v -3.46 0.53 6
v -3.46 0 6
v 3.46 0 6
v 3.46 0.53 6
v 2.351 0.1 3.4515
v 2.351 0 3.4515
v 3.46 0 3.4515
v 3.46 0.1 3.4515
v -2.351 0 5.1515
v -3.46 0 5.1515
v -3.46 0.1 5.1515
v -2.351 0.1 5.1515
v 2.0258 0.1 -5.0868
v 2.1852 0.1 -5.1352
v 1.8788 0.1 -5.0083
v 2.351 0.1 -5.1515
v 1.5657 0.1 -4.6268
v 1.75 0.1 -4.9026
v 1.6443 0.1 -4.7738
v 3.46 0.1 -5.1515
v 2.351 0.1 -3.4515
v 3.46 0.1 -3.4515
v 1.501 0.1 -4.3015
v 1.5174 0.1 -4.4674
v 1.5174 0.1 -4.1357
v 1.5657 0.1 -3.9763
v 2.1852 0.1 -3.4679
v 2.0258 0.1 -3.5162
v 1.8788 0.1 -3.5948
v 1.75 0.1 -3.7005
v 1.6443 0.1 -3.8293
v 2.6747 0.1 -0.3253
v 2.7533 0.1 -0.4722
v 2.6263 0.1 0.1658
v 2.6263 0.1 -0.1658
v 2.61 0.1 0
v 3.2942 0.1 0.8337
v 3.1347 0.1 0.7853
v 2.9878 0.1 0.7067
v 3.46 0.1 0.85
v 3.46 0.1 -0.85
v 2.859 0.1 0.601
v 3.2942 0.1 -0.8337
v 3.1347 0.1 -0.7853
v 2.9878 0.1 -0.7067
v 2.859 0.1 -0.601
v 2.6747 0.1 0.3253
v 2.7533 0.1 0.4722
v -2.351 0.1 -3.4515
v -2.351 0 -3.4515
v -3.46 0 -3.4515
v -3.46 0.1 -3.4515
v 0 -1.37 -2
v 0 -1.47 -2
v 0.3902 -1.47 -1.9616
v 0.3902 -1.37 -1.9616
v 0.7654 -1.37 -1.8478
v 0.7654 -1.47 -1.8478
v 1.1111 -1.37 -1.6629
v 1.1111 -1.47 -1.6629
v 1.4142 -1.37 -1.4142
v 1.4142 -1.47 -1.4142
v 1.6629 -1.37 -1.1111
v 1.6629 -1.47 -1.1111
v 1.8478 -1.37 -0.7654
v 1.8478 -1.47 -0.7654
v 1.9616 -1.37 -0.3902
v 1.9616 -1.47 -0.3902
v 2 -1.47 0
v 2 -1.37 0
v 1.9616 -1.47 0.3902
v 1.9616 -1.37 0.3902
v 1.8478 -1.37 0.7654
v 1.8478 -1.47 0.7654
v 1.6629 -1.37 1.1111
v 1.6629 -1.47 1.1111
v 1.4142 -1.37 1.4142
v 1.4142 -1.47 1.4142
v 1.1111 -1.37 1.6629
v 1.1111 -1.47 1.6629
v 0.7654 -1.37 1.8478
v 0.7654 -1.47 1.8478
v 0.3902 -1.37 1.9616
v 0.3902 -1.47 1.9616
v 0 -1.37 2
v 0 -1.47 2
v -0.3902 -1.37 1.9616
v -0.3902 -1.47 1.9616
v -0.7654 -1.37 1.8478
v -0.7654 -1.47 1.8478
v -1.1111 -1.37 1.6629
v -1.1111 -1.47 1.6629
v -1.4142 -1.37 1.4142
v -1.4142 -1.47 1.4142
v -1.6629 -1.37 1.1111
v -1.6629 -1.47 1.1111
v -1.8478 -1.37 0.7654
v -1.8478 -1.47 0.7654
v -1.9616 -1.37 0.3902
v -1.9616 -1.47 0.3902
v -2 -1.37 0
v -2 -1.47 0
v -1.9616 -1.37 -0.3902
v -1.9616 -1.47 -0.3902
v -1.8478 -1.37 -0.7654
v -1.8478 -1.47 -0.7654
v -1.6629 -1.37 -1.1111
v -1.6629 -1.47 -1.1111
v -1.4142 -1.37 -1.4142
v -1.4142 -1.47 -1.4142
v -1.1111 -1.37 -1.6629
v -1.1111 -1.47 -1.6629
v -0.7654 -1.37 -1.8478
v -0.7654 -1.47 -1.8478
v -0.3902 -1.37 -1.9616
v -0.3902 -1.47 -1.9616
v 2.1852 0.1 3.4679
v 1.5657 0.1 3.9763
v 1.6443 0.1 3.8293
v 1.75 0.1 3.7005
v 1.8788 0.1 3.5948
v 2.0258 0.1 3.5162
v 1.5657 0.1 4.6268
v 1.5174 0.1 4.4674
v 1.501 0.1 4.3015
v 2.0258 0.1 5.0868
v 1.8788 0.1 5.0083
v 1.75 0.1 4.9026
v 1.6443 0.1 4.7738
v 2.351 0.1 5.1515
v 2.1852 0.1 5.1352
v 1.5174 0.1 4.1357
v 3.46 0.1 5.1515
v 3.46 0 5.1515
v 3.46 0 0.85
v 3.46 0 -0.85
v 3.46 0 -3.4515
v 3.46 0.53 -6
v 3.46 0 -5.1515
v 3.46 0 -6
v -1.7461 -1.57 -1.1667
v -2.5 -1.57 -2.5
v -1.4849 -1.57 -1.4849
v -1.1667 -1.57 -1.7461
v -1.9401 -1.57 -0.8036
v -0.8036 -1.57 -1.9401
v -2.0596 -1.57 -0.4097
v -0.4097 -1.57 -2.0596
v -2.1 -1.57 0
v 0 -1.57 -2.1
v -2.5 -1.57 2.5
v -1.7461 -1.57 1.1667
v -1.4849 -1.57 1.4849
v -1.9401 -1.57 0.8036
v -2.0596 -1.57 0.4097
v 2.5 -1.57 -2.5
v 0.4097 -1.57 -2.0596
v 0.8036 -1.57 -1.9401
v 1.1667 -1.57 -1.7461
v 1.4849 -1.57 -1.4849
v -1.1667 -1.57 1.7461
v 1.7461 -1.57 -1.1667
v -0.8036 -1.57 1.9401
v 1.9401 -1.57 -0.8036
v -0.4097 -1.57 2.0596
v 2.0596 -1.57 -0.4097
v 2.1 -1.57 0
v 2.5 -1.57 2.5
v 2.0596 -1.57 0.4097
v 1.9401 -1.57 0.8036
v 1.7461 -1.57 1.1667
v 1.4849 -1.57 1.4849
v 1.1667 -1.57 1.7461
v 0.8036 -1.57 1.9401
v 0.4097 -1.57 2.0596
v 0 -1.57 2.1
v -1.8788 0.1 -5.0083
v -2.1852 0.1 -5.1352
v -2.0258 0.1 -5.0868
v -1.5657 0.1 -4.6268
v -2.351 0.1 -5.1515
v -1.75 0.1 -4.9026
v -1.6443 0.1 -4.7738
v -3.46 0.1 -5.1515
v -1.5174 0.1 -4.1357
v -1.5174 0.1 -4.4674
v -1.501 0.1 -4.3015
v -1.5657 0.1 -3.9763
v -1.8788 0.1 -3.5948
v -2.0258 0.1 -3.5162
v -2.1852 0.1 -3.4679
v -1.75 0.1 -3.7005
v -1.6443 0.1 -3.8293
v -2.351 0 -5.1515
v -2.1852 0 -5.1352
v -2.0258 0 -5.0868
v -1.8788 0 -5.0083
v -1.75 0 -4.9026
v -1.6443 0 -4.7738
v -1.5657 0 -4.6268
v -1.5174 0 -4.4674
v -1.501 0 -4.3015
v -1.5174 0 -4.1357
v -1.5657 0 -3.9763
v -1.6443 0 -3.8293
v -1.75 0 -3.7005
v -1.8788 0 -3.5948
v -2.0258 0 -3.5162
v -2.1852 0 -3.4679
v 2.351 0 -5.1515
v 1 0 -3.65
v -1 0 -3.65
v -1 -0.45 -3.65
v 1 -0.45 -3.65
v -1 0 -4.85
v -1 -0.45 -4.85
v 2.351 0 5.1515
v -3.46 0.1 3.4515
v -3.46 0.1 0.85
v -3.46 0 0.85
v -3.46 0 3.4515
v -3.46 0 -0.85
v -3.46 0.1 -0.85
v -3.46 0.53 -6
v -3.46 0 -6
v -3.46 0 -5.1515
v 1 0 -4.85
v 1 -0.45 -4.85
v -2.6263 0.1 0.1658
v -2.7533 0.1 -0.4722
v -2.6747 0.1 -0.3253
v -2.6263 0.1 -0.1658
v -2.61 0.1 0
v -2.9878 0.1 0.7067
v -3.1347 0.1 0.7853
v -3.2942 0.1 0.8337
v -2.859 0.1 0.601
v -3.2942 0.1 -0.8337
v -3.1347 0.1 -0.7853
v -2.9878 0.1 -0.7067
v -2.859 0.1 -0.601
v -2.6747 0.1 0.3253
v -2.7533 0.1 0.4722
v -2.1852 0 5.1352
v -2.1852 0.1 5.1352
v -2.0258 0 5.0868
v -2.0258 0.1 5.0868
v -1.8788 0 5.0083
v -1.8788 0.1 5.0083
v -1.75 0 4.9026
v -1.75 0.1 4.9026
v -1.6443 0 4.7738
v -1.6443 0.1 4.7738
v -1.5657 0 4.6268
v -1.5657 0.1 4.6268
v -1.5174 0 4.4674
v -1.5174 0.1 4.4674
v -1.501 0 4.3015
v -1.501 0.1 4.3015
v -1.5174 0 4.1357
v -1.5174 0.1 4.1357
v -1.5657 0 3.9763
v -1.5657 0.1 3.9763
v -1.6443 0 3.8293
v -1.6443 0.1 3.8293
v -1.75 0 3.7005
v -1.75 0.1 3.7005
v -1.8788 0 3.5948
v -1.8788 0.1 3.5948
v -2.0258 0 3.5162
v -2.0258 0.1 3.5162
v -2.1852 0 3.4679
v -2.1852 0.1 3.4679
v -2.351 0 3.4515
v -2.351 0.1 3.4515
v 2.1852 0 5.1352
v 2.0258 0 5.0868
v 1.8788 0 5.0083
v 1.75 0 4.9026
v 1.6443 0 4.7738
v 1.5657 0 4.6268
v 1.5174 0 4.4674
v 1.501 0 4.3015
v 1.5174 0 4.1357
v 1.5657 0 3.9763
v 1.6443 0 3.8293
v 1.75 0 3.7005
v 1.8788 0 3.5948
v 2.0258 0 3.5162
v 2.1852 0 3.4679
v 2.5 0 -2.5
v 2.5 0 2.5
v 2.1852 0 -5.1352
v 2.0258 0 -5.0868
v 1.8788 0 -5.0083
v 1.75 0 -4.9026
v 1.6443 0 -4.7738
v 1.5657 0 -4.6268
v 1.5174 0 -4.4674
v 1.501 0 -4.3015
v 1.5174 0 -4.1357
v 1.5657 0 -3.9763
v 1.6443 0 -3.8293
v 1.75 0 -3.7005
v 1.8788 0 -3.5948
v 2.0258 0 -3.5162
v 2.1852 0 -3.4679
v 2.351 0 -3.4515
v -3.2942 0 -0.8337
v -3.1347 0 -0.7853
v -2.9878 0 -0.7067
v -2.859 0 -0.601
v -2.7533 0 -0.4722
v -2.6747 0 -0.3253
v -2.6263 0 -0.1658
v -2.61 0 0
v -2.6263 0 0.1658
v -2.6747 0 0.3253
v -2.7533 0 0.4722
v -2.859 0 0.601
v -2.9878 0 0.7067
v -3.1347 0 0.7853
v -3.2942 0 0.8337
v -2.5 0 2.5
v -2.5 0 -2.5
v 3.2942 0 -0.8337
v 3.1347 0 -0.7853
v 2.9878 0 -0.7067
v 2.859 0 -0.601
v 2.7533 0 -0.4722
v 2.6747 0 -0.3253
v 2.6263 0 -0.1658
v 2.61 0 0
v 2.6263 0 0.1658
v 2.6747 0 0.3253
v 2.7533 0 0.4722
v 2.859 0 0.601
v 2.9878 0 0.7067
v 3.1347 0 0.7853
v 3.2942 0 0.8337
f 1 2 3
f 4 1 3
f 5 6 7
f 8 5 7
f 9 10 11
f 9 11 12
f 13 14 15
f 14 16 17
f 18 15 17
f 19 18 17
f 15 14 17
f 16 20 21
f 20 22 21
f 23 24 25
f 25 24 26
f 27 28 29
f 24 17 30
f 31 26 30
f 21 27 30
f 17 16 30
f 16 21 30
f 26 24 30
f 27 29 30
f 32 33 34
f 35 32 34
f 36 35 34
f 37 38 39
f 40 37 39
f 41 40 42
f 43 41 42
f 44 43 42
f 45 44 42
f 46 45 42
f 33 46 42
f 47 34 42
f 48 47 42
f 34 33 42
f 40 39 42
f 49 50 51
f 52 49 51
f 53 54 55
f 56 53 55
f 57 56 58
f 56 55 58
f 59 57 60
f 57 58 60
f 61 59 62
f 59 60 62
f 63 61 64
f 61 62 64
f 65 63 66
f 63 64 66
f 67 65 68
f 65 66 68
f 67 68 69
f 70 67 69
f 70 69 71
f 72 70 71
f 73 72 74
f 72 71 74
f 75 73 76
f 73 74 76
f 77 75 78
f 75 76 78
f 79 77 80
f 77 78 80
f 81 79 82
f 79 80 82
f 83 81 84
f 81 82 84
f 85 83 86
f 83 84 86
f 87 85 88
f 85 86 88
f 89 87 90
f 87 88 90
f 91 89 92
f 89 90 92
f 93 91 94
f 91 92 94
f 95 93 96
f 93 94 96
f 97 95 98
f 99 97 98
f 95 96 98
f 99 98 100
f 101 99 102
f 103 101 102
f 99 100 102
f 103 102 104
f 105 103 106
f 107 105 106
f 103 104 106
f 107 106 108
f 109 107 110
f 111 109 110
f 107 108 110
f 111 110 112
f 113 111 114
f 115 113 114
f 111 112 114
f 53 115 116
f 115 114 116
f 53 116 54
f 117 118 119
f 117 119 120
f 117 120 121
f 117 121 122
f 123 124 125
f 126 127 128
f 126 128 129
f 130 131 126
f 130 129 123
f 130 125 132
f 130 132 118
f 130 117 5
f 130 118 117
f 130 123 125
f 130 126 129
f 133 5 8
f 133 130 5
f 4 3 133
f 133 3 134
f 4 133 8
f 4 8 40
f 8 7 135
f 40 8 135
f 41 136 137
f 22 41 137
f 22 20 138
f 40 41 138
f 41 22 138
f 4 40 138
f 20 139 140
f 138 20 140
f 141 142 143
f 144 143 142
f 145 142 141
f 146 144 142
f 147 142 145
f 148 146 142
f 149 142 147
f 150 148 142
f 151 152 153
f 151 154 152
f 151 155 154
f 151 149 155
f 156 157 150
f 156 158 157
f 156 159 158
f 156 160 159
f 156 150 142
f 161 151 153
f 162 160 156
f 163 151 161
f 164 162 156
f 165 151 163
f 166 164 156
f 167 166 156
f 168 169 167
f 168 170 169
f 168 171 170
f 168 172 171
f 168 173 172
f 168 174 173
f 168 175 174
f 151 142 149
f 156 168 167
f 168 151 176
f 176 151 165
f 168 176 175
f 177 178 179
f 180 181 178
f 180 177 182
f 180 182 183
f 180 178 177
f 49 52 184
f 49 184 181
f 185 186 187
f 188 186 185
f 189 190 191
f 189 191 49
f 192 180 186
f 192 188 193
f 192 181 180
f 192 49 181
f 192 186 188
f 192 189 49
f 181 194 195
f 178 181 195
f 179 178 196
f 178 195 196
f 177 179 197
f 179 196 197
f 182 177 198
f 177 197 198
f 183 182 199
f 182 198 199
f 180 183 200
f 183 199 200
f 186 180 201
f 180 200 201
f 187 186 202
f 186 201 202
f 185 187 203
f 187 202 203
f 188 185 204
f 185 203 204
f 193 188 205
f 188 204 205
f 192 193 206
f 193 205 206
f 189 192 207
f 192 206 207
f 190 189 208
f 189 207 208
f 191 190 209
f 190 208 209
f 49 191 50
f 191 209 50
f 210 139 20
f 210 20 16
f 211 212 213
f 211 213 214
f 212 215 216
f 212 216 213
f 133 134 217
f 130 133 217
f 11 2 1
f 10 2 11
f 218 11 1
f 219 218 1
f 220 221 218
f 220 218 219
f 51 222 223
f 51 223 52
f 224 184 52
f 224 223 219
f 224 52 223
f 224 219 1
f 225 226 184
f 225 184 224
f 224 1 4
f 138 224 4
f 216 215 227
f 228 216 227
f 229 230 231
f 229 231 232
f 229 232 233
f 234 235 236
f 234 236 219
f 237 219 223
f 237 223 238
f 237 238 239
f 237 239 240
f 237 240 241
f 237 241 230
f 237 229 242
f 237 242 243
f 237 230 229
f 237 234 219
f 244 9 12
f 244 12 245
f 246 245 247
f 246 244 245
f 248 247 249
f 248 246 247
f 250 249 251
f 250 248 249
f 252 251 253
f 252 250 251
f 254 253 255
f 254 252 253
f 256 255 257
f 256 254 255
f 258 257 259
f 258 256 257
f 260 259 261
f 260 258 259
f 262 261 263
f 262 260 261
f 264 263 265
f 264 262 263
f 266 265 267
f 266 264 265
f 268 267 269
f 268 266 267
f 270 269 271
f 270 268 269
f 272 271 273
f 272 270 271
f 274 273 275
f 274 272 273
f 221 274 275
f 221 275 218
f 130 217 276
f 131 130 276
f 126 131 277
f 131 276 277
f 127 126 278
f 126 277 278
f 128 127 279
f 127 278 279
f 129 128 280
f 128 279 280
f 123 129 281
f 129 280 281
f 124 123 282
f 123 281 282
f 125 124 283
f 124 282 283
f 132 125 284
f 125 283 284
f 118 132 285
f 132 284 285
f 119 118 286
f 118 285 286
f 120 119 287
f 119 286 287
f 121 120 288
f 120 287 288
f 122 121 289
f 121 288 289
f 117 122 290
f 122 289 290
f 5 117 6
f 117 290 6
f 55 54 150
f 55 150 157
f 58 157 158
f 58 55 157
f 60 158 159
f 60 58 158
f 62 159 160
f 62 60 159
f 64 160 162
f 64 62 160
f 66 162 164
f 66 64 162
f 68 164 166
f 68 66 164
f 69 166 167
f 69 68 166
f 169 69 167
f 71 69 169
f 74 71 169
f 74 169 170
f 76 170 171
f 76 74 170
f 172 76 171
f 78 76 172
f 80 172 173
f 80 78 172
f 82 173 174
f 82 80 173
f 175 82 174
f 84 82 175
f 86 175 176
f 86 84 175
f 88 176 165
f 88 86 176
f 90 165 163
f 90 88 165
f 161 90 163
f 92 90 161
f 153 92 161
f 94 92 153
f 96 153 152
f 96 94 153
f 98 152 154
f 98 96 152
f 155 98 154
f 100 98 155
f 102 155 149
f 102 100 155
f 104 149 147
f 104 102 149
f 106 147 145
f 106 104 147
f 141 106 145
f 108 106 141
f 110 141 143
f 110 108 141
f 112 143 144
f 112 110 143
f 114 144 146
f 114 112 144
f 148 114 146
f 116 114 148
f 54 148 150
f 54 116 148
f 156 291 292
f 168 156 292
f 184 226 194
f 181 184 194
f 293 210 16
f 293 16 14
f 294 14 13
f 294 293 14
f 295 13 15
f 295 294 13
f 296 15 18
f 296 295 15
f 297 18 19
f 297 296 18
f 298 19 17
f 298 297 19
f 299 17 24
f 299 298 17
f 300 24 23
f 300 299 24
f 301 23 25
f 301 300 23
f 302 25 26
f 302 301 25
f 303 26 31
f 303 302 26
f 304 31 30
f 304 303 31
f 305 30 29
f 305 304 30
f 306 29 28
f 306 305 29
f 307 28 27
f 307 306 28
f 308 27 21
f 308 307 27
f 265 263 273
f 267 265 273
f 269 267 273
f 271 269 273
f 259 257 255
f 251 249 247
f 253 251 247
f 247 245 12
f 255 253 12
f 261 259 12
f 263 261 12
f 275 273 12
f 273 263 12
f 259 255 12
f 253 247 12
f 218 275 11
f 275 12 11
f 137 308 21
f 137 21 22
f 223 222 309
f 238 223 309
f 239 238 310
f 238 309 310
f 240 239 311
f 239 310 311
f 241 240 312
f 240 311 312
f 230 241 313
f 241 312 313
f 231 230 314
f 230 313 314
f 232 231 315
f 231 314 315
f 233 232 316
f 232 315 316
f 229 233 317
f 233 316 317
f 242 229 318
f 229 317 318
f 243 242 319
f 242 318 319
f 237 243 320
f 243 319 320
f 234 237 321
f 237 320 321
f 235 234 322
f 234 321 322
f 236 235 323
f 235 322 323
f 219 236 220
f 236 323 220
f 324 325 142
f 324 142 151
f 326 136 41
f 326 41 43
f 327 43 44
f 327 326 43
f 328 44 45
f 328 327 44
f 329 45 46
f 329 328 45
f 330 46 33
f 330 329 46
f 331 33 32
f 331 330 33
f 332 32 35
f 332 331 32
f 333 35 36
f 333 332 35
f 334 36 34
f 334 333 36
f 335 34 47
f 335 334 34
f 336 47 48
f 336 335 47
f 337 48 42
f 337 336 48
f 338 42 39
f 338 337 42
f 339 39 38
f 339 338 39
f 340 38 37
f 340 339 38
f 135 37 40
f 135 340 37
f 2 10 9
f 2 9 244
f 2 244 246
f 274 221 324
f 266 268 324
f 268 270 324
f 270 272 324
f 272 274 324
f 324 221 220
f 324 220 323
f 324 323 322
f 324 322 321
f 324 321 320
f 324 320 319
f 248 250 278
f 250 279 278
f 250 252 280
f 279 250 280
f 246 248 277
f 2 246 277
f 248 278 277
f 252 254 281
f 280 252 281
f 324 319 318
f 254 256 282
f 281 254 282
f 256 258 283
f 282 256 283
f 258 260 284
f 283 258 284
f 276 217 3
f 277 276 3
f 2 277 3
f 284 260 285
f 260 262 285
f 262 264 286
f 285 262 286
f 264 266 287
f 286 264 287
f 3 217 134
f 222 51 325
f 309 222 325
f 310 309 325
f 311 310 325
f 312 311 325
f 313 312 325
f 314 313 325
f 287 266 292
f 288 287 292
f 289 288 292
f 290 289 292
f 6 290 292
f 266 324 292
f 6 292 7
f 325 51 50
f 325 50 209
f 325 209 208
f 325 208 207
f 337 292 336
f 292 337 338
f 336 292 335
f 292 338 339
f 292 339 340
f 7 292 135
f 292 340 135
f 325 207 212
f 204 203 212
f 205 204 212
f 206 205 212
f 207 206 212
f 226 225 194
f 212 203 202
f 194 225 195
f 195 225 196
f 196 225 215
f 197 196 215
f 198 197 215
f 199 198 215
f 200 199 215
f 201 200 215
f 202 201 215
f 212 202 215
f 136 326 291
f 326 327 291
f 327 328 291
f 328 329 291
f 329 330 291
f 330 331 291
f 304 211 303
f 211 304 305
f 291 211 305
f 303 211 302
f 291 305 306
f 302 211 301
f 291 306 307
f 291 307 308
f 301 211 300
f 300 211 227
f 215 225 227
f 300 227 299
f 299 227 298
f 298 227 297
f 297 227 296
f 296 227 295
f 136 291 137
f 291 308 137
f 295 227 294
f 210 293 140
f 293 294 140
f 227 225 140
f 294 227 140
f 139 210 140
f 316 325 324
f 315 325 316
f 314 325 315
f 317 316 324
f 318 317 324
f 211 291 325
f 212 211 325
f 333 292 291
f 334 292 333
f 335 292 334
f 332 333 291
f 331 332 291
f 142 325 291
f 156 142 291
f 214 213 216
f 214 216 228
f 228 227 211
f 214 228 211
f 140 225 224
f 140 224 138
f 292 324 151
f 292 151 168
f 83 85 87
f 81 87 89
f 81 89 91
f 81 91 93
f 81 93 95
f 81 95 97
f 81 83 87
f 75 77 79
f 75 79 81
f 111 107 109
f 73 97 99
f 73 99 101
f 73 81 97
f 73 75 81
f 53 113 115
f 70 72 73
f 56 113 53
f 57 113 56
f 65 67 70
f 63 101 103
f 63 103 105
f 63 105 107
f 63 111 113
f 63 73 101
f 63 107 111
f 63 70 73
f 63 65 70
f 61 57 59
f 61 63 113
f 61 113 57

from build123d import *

# Parameters (mm, degrees)
SKETCH1_W           = 6.92
SKETCH1_H           = 12
BOSS_EXTRUDE1_DEPTH = 0.53
SKETCH2_W           = 5
SKETCH2_H           = 5
BOSS_EXTRUDE2_DEPTH = 1.57
SKETCH3_R           = 2
CUT_EXTRUDE1_DEPTH  = 0.2
CHAMFER1_SIZE       = 0.1
SKETCH6_W           = 2
SKETCH6_H           = 1.2
BOSS_EXTRUDE3_DEPTH = 0.45
CUT_EXTRUDE2_DEPTH  = 0.1


with BuildPart() as part:
    # Sketch1 → Boss-Extrude1 (new body)
    with BuildSketch(Plane(origin=(0, 0, 0), x_dir=(1, 0, 0), z_dir=(0, 1, 0))):
        Rectangle(SKETCH1_W, SKETCH1_H)
    extrude(amount=BOSS_EXTRUDE1_DEPTH)

    # Sketch2 → Boss-Extrude2 (add)
    with BuildSketch(Plane.XZ):
        Rectangle(SKETCH2_W, SKETCH2_H)
    extrude(amount=BOSS_EXTRUDE2_DEPTH)

    # Sketch3 → Cut-Extrude1 (cut)
    with BuildSketch(Plane.XZ.offset(1.57)):
        with Locations(Location((0, 0, 0), (0, 0, 270))):
            Circle(SKETCH3_R)
    extrude(amount=-CUT_EXTRUDE1_DEPTH, mode=Mode.SUBTRACT)

    # Chamfer1
    chamfer1_edges = [part.edges().sort_by_distance(p)[0] for p in [
        (0, -1.57, 2),
    ]]
    chamfer(chamfer1_edges, length=CHAMFER1_SIZE)

    # Sketch6 → Boss-Extrude3 (add)
    with BuildSketch(Plane.XZ):
        with Locations((0, -4.25)):
            Rectangle(SKETCH6_W, SKETCH6_H)
    extrude(amount=BOSS_EXTRUDE3_DEPTH)

    # Sketch4 → Cut-Extrude2 (cut)
    with BuildSketch(Plane.XZ):
        with BuildLine():
            Line((3.46, 0.85), (3.46, -0.85))
            ThreePointArc((3.46, -0.85), (2.61, 0), (3.46, 0.85))
        make_face()
        with BuildLine():
            Line((3.46, 5.151541621), (2.351035145, 5.151541621))
            ThreePointArc((2.351035145, 5.151541621), (1.501035145, 4.301541621), (2.351035145, 3.451541621))
            Line((2.351035145, 3.451541621), (3.46, 3.451541621))
            Line((3.46, 3.451541621), (3.46, 5.151541621))
        make_face()
        with BuildLine():
            Line((3.46, -5.151541621), (2.351035145, -5.151541621))
            ThreePointArc((2.351035145, -5.151541621), (1.501035145, -4.301541621), (2.351035145, -3.451541621))
            Line((2.351035145, -3.451541621), (3.46, -3.451541621))
            Line((3.46, -3.451541621), (3.46, -5.151541621))
        make_face()
        with BuildLine():
            Line((-2.351035145, -3.451541621), (-3.46, -3.451541621))
            Line((-3.46, -3.451541621), (-3.46, -5.151541621))
            Line((-3.46, -5.151541621), (-2.351035145, -5.151541621))
            ThreePointArc((-2.351035145, -5.151541621), (-1.501035145, -4.301541621), (-2.351035145, -3.451541621))
        make_face()
        with BuildLine():
            Line((-3.46, 3.451541621), (-3.46, 5.151541621))
            Line((-3.46, 5.151541621), (-2.351035145, 5.151541621))
            ThreePointArc((-2.351035145, 5.151541621), (-1.501035145, 4.301541621), (-2.351035145, 3.451541621))
            Line((-2.351035145, 3.451541621), (-3.46, 3.451541621))
        make_face()
        with BuildLine():
            Line((-3.46, 0.85), (-3.46, -0.85))
            ThreePointArc((-3.46, -0.85), (-2.61, 0), (-3.46, 0.85))
        make_face()
    extrude(amount=-CUT_EXTRUDE2_DEPTH, mode=Mode.SUBTRACT)


solid = part.part
